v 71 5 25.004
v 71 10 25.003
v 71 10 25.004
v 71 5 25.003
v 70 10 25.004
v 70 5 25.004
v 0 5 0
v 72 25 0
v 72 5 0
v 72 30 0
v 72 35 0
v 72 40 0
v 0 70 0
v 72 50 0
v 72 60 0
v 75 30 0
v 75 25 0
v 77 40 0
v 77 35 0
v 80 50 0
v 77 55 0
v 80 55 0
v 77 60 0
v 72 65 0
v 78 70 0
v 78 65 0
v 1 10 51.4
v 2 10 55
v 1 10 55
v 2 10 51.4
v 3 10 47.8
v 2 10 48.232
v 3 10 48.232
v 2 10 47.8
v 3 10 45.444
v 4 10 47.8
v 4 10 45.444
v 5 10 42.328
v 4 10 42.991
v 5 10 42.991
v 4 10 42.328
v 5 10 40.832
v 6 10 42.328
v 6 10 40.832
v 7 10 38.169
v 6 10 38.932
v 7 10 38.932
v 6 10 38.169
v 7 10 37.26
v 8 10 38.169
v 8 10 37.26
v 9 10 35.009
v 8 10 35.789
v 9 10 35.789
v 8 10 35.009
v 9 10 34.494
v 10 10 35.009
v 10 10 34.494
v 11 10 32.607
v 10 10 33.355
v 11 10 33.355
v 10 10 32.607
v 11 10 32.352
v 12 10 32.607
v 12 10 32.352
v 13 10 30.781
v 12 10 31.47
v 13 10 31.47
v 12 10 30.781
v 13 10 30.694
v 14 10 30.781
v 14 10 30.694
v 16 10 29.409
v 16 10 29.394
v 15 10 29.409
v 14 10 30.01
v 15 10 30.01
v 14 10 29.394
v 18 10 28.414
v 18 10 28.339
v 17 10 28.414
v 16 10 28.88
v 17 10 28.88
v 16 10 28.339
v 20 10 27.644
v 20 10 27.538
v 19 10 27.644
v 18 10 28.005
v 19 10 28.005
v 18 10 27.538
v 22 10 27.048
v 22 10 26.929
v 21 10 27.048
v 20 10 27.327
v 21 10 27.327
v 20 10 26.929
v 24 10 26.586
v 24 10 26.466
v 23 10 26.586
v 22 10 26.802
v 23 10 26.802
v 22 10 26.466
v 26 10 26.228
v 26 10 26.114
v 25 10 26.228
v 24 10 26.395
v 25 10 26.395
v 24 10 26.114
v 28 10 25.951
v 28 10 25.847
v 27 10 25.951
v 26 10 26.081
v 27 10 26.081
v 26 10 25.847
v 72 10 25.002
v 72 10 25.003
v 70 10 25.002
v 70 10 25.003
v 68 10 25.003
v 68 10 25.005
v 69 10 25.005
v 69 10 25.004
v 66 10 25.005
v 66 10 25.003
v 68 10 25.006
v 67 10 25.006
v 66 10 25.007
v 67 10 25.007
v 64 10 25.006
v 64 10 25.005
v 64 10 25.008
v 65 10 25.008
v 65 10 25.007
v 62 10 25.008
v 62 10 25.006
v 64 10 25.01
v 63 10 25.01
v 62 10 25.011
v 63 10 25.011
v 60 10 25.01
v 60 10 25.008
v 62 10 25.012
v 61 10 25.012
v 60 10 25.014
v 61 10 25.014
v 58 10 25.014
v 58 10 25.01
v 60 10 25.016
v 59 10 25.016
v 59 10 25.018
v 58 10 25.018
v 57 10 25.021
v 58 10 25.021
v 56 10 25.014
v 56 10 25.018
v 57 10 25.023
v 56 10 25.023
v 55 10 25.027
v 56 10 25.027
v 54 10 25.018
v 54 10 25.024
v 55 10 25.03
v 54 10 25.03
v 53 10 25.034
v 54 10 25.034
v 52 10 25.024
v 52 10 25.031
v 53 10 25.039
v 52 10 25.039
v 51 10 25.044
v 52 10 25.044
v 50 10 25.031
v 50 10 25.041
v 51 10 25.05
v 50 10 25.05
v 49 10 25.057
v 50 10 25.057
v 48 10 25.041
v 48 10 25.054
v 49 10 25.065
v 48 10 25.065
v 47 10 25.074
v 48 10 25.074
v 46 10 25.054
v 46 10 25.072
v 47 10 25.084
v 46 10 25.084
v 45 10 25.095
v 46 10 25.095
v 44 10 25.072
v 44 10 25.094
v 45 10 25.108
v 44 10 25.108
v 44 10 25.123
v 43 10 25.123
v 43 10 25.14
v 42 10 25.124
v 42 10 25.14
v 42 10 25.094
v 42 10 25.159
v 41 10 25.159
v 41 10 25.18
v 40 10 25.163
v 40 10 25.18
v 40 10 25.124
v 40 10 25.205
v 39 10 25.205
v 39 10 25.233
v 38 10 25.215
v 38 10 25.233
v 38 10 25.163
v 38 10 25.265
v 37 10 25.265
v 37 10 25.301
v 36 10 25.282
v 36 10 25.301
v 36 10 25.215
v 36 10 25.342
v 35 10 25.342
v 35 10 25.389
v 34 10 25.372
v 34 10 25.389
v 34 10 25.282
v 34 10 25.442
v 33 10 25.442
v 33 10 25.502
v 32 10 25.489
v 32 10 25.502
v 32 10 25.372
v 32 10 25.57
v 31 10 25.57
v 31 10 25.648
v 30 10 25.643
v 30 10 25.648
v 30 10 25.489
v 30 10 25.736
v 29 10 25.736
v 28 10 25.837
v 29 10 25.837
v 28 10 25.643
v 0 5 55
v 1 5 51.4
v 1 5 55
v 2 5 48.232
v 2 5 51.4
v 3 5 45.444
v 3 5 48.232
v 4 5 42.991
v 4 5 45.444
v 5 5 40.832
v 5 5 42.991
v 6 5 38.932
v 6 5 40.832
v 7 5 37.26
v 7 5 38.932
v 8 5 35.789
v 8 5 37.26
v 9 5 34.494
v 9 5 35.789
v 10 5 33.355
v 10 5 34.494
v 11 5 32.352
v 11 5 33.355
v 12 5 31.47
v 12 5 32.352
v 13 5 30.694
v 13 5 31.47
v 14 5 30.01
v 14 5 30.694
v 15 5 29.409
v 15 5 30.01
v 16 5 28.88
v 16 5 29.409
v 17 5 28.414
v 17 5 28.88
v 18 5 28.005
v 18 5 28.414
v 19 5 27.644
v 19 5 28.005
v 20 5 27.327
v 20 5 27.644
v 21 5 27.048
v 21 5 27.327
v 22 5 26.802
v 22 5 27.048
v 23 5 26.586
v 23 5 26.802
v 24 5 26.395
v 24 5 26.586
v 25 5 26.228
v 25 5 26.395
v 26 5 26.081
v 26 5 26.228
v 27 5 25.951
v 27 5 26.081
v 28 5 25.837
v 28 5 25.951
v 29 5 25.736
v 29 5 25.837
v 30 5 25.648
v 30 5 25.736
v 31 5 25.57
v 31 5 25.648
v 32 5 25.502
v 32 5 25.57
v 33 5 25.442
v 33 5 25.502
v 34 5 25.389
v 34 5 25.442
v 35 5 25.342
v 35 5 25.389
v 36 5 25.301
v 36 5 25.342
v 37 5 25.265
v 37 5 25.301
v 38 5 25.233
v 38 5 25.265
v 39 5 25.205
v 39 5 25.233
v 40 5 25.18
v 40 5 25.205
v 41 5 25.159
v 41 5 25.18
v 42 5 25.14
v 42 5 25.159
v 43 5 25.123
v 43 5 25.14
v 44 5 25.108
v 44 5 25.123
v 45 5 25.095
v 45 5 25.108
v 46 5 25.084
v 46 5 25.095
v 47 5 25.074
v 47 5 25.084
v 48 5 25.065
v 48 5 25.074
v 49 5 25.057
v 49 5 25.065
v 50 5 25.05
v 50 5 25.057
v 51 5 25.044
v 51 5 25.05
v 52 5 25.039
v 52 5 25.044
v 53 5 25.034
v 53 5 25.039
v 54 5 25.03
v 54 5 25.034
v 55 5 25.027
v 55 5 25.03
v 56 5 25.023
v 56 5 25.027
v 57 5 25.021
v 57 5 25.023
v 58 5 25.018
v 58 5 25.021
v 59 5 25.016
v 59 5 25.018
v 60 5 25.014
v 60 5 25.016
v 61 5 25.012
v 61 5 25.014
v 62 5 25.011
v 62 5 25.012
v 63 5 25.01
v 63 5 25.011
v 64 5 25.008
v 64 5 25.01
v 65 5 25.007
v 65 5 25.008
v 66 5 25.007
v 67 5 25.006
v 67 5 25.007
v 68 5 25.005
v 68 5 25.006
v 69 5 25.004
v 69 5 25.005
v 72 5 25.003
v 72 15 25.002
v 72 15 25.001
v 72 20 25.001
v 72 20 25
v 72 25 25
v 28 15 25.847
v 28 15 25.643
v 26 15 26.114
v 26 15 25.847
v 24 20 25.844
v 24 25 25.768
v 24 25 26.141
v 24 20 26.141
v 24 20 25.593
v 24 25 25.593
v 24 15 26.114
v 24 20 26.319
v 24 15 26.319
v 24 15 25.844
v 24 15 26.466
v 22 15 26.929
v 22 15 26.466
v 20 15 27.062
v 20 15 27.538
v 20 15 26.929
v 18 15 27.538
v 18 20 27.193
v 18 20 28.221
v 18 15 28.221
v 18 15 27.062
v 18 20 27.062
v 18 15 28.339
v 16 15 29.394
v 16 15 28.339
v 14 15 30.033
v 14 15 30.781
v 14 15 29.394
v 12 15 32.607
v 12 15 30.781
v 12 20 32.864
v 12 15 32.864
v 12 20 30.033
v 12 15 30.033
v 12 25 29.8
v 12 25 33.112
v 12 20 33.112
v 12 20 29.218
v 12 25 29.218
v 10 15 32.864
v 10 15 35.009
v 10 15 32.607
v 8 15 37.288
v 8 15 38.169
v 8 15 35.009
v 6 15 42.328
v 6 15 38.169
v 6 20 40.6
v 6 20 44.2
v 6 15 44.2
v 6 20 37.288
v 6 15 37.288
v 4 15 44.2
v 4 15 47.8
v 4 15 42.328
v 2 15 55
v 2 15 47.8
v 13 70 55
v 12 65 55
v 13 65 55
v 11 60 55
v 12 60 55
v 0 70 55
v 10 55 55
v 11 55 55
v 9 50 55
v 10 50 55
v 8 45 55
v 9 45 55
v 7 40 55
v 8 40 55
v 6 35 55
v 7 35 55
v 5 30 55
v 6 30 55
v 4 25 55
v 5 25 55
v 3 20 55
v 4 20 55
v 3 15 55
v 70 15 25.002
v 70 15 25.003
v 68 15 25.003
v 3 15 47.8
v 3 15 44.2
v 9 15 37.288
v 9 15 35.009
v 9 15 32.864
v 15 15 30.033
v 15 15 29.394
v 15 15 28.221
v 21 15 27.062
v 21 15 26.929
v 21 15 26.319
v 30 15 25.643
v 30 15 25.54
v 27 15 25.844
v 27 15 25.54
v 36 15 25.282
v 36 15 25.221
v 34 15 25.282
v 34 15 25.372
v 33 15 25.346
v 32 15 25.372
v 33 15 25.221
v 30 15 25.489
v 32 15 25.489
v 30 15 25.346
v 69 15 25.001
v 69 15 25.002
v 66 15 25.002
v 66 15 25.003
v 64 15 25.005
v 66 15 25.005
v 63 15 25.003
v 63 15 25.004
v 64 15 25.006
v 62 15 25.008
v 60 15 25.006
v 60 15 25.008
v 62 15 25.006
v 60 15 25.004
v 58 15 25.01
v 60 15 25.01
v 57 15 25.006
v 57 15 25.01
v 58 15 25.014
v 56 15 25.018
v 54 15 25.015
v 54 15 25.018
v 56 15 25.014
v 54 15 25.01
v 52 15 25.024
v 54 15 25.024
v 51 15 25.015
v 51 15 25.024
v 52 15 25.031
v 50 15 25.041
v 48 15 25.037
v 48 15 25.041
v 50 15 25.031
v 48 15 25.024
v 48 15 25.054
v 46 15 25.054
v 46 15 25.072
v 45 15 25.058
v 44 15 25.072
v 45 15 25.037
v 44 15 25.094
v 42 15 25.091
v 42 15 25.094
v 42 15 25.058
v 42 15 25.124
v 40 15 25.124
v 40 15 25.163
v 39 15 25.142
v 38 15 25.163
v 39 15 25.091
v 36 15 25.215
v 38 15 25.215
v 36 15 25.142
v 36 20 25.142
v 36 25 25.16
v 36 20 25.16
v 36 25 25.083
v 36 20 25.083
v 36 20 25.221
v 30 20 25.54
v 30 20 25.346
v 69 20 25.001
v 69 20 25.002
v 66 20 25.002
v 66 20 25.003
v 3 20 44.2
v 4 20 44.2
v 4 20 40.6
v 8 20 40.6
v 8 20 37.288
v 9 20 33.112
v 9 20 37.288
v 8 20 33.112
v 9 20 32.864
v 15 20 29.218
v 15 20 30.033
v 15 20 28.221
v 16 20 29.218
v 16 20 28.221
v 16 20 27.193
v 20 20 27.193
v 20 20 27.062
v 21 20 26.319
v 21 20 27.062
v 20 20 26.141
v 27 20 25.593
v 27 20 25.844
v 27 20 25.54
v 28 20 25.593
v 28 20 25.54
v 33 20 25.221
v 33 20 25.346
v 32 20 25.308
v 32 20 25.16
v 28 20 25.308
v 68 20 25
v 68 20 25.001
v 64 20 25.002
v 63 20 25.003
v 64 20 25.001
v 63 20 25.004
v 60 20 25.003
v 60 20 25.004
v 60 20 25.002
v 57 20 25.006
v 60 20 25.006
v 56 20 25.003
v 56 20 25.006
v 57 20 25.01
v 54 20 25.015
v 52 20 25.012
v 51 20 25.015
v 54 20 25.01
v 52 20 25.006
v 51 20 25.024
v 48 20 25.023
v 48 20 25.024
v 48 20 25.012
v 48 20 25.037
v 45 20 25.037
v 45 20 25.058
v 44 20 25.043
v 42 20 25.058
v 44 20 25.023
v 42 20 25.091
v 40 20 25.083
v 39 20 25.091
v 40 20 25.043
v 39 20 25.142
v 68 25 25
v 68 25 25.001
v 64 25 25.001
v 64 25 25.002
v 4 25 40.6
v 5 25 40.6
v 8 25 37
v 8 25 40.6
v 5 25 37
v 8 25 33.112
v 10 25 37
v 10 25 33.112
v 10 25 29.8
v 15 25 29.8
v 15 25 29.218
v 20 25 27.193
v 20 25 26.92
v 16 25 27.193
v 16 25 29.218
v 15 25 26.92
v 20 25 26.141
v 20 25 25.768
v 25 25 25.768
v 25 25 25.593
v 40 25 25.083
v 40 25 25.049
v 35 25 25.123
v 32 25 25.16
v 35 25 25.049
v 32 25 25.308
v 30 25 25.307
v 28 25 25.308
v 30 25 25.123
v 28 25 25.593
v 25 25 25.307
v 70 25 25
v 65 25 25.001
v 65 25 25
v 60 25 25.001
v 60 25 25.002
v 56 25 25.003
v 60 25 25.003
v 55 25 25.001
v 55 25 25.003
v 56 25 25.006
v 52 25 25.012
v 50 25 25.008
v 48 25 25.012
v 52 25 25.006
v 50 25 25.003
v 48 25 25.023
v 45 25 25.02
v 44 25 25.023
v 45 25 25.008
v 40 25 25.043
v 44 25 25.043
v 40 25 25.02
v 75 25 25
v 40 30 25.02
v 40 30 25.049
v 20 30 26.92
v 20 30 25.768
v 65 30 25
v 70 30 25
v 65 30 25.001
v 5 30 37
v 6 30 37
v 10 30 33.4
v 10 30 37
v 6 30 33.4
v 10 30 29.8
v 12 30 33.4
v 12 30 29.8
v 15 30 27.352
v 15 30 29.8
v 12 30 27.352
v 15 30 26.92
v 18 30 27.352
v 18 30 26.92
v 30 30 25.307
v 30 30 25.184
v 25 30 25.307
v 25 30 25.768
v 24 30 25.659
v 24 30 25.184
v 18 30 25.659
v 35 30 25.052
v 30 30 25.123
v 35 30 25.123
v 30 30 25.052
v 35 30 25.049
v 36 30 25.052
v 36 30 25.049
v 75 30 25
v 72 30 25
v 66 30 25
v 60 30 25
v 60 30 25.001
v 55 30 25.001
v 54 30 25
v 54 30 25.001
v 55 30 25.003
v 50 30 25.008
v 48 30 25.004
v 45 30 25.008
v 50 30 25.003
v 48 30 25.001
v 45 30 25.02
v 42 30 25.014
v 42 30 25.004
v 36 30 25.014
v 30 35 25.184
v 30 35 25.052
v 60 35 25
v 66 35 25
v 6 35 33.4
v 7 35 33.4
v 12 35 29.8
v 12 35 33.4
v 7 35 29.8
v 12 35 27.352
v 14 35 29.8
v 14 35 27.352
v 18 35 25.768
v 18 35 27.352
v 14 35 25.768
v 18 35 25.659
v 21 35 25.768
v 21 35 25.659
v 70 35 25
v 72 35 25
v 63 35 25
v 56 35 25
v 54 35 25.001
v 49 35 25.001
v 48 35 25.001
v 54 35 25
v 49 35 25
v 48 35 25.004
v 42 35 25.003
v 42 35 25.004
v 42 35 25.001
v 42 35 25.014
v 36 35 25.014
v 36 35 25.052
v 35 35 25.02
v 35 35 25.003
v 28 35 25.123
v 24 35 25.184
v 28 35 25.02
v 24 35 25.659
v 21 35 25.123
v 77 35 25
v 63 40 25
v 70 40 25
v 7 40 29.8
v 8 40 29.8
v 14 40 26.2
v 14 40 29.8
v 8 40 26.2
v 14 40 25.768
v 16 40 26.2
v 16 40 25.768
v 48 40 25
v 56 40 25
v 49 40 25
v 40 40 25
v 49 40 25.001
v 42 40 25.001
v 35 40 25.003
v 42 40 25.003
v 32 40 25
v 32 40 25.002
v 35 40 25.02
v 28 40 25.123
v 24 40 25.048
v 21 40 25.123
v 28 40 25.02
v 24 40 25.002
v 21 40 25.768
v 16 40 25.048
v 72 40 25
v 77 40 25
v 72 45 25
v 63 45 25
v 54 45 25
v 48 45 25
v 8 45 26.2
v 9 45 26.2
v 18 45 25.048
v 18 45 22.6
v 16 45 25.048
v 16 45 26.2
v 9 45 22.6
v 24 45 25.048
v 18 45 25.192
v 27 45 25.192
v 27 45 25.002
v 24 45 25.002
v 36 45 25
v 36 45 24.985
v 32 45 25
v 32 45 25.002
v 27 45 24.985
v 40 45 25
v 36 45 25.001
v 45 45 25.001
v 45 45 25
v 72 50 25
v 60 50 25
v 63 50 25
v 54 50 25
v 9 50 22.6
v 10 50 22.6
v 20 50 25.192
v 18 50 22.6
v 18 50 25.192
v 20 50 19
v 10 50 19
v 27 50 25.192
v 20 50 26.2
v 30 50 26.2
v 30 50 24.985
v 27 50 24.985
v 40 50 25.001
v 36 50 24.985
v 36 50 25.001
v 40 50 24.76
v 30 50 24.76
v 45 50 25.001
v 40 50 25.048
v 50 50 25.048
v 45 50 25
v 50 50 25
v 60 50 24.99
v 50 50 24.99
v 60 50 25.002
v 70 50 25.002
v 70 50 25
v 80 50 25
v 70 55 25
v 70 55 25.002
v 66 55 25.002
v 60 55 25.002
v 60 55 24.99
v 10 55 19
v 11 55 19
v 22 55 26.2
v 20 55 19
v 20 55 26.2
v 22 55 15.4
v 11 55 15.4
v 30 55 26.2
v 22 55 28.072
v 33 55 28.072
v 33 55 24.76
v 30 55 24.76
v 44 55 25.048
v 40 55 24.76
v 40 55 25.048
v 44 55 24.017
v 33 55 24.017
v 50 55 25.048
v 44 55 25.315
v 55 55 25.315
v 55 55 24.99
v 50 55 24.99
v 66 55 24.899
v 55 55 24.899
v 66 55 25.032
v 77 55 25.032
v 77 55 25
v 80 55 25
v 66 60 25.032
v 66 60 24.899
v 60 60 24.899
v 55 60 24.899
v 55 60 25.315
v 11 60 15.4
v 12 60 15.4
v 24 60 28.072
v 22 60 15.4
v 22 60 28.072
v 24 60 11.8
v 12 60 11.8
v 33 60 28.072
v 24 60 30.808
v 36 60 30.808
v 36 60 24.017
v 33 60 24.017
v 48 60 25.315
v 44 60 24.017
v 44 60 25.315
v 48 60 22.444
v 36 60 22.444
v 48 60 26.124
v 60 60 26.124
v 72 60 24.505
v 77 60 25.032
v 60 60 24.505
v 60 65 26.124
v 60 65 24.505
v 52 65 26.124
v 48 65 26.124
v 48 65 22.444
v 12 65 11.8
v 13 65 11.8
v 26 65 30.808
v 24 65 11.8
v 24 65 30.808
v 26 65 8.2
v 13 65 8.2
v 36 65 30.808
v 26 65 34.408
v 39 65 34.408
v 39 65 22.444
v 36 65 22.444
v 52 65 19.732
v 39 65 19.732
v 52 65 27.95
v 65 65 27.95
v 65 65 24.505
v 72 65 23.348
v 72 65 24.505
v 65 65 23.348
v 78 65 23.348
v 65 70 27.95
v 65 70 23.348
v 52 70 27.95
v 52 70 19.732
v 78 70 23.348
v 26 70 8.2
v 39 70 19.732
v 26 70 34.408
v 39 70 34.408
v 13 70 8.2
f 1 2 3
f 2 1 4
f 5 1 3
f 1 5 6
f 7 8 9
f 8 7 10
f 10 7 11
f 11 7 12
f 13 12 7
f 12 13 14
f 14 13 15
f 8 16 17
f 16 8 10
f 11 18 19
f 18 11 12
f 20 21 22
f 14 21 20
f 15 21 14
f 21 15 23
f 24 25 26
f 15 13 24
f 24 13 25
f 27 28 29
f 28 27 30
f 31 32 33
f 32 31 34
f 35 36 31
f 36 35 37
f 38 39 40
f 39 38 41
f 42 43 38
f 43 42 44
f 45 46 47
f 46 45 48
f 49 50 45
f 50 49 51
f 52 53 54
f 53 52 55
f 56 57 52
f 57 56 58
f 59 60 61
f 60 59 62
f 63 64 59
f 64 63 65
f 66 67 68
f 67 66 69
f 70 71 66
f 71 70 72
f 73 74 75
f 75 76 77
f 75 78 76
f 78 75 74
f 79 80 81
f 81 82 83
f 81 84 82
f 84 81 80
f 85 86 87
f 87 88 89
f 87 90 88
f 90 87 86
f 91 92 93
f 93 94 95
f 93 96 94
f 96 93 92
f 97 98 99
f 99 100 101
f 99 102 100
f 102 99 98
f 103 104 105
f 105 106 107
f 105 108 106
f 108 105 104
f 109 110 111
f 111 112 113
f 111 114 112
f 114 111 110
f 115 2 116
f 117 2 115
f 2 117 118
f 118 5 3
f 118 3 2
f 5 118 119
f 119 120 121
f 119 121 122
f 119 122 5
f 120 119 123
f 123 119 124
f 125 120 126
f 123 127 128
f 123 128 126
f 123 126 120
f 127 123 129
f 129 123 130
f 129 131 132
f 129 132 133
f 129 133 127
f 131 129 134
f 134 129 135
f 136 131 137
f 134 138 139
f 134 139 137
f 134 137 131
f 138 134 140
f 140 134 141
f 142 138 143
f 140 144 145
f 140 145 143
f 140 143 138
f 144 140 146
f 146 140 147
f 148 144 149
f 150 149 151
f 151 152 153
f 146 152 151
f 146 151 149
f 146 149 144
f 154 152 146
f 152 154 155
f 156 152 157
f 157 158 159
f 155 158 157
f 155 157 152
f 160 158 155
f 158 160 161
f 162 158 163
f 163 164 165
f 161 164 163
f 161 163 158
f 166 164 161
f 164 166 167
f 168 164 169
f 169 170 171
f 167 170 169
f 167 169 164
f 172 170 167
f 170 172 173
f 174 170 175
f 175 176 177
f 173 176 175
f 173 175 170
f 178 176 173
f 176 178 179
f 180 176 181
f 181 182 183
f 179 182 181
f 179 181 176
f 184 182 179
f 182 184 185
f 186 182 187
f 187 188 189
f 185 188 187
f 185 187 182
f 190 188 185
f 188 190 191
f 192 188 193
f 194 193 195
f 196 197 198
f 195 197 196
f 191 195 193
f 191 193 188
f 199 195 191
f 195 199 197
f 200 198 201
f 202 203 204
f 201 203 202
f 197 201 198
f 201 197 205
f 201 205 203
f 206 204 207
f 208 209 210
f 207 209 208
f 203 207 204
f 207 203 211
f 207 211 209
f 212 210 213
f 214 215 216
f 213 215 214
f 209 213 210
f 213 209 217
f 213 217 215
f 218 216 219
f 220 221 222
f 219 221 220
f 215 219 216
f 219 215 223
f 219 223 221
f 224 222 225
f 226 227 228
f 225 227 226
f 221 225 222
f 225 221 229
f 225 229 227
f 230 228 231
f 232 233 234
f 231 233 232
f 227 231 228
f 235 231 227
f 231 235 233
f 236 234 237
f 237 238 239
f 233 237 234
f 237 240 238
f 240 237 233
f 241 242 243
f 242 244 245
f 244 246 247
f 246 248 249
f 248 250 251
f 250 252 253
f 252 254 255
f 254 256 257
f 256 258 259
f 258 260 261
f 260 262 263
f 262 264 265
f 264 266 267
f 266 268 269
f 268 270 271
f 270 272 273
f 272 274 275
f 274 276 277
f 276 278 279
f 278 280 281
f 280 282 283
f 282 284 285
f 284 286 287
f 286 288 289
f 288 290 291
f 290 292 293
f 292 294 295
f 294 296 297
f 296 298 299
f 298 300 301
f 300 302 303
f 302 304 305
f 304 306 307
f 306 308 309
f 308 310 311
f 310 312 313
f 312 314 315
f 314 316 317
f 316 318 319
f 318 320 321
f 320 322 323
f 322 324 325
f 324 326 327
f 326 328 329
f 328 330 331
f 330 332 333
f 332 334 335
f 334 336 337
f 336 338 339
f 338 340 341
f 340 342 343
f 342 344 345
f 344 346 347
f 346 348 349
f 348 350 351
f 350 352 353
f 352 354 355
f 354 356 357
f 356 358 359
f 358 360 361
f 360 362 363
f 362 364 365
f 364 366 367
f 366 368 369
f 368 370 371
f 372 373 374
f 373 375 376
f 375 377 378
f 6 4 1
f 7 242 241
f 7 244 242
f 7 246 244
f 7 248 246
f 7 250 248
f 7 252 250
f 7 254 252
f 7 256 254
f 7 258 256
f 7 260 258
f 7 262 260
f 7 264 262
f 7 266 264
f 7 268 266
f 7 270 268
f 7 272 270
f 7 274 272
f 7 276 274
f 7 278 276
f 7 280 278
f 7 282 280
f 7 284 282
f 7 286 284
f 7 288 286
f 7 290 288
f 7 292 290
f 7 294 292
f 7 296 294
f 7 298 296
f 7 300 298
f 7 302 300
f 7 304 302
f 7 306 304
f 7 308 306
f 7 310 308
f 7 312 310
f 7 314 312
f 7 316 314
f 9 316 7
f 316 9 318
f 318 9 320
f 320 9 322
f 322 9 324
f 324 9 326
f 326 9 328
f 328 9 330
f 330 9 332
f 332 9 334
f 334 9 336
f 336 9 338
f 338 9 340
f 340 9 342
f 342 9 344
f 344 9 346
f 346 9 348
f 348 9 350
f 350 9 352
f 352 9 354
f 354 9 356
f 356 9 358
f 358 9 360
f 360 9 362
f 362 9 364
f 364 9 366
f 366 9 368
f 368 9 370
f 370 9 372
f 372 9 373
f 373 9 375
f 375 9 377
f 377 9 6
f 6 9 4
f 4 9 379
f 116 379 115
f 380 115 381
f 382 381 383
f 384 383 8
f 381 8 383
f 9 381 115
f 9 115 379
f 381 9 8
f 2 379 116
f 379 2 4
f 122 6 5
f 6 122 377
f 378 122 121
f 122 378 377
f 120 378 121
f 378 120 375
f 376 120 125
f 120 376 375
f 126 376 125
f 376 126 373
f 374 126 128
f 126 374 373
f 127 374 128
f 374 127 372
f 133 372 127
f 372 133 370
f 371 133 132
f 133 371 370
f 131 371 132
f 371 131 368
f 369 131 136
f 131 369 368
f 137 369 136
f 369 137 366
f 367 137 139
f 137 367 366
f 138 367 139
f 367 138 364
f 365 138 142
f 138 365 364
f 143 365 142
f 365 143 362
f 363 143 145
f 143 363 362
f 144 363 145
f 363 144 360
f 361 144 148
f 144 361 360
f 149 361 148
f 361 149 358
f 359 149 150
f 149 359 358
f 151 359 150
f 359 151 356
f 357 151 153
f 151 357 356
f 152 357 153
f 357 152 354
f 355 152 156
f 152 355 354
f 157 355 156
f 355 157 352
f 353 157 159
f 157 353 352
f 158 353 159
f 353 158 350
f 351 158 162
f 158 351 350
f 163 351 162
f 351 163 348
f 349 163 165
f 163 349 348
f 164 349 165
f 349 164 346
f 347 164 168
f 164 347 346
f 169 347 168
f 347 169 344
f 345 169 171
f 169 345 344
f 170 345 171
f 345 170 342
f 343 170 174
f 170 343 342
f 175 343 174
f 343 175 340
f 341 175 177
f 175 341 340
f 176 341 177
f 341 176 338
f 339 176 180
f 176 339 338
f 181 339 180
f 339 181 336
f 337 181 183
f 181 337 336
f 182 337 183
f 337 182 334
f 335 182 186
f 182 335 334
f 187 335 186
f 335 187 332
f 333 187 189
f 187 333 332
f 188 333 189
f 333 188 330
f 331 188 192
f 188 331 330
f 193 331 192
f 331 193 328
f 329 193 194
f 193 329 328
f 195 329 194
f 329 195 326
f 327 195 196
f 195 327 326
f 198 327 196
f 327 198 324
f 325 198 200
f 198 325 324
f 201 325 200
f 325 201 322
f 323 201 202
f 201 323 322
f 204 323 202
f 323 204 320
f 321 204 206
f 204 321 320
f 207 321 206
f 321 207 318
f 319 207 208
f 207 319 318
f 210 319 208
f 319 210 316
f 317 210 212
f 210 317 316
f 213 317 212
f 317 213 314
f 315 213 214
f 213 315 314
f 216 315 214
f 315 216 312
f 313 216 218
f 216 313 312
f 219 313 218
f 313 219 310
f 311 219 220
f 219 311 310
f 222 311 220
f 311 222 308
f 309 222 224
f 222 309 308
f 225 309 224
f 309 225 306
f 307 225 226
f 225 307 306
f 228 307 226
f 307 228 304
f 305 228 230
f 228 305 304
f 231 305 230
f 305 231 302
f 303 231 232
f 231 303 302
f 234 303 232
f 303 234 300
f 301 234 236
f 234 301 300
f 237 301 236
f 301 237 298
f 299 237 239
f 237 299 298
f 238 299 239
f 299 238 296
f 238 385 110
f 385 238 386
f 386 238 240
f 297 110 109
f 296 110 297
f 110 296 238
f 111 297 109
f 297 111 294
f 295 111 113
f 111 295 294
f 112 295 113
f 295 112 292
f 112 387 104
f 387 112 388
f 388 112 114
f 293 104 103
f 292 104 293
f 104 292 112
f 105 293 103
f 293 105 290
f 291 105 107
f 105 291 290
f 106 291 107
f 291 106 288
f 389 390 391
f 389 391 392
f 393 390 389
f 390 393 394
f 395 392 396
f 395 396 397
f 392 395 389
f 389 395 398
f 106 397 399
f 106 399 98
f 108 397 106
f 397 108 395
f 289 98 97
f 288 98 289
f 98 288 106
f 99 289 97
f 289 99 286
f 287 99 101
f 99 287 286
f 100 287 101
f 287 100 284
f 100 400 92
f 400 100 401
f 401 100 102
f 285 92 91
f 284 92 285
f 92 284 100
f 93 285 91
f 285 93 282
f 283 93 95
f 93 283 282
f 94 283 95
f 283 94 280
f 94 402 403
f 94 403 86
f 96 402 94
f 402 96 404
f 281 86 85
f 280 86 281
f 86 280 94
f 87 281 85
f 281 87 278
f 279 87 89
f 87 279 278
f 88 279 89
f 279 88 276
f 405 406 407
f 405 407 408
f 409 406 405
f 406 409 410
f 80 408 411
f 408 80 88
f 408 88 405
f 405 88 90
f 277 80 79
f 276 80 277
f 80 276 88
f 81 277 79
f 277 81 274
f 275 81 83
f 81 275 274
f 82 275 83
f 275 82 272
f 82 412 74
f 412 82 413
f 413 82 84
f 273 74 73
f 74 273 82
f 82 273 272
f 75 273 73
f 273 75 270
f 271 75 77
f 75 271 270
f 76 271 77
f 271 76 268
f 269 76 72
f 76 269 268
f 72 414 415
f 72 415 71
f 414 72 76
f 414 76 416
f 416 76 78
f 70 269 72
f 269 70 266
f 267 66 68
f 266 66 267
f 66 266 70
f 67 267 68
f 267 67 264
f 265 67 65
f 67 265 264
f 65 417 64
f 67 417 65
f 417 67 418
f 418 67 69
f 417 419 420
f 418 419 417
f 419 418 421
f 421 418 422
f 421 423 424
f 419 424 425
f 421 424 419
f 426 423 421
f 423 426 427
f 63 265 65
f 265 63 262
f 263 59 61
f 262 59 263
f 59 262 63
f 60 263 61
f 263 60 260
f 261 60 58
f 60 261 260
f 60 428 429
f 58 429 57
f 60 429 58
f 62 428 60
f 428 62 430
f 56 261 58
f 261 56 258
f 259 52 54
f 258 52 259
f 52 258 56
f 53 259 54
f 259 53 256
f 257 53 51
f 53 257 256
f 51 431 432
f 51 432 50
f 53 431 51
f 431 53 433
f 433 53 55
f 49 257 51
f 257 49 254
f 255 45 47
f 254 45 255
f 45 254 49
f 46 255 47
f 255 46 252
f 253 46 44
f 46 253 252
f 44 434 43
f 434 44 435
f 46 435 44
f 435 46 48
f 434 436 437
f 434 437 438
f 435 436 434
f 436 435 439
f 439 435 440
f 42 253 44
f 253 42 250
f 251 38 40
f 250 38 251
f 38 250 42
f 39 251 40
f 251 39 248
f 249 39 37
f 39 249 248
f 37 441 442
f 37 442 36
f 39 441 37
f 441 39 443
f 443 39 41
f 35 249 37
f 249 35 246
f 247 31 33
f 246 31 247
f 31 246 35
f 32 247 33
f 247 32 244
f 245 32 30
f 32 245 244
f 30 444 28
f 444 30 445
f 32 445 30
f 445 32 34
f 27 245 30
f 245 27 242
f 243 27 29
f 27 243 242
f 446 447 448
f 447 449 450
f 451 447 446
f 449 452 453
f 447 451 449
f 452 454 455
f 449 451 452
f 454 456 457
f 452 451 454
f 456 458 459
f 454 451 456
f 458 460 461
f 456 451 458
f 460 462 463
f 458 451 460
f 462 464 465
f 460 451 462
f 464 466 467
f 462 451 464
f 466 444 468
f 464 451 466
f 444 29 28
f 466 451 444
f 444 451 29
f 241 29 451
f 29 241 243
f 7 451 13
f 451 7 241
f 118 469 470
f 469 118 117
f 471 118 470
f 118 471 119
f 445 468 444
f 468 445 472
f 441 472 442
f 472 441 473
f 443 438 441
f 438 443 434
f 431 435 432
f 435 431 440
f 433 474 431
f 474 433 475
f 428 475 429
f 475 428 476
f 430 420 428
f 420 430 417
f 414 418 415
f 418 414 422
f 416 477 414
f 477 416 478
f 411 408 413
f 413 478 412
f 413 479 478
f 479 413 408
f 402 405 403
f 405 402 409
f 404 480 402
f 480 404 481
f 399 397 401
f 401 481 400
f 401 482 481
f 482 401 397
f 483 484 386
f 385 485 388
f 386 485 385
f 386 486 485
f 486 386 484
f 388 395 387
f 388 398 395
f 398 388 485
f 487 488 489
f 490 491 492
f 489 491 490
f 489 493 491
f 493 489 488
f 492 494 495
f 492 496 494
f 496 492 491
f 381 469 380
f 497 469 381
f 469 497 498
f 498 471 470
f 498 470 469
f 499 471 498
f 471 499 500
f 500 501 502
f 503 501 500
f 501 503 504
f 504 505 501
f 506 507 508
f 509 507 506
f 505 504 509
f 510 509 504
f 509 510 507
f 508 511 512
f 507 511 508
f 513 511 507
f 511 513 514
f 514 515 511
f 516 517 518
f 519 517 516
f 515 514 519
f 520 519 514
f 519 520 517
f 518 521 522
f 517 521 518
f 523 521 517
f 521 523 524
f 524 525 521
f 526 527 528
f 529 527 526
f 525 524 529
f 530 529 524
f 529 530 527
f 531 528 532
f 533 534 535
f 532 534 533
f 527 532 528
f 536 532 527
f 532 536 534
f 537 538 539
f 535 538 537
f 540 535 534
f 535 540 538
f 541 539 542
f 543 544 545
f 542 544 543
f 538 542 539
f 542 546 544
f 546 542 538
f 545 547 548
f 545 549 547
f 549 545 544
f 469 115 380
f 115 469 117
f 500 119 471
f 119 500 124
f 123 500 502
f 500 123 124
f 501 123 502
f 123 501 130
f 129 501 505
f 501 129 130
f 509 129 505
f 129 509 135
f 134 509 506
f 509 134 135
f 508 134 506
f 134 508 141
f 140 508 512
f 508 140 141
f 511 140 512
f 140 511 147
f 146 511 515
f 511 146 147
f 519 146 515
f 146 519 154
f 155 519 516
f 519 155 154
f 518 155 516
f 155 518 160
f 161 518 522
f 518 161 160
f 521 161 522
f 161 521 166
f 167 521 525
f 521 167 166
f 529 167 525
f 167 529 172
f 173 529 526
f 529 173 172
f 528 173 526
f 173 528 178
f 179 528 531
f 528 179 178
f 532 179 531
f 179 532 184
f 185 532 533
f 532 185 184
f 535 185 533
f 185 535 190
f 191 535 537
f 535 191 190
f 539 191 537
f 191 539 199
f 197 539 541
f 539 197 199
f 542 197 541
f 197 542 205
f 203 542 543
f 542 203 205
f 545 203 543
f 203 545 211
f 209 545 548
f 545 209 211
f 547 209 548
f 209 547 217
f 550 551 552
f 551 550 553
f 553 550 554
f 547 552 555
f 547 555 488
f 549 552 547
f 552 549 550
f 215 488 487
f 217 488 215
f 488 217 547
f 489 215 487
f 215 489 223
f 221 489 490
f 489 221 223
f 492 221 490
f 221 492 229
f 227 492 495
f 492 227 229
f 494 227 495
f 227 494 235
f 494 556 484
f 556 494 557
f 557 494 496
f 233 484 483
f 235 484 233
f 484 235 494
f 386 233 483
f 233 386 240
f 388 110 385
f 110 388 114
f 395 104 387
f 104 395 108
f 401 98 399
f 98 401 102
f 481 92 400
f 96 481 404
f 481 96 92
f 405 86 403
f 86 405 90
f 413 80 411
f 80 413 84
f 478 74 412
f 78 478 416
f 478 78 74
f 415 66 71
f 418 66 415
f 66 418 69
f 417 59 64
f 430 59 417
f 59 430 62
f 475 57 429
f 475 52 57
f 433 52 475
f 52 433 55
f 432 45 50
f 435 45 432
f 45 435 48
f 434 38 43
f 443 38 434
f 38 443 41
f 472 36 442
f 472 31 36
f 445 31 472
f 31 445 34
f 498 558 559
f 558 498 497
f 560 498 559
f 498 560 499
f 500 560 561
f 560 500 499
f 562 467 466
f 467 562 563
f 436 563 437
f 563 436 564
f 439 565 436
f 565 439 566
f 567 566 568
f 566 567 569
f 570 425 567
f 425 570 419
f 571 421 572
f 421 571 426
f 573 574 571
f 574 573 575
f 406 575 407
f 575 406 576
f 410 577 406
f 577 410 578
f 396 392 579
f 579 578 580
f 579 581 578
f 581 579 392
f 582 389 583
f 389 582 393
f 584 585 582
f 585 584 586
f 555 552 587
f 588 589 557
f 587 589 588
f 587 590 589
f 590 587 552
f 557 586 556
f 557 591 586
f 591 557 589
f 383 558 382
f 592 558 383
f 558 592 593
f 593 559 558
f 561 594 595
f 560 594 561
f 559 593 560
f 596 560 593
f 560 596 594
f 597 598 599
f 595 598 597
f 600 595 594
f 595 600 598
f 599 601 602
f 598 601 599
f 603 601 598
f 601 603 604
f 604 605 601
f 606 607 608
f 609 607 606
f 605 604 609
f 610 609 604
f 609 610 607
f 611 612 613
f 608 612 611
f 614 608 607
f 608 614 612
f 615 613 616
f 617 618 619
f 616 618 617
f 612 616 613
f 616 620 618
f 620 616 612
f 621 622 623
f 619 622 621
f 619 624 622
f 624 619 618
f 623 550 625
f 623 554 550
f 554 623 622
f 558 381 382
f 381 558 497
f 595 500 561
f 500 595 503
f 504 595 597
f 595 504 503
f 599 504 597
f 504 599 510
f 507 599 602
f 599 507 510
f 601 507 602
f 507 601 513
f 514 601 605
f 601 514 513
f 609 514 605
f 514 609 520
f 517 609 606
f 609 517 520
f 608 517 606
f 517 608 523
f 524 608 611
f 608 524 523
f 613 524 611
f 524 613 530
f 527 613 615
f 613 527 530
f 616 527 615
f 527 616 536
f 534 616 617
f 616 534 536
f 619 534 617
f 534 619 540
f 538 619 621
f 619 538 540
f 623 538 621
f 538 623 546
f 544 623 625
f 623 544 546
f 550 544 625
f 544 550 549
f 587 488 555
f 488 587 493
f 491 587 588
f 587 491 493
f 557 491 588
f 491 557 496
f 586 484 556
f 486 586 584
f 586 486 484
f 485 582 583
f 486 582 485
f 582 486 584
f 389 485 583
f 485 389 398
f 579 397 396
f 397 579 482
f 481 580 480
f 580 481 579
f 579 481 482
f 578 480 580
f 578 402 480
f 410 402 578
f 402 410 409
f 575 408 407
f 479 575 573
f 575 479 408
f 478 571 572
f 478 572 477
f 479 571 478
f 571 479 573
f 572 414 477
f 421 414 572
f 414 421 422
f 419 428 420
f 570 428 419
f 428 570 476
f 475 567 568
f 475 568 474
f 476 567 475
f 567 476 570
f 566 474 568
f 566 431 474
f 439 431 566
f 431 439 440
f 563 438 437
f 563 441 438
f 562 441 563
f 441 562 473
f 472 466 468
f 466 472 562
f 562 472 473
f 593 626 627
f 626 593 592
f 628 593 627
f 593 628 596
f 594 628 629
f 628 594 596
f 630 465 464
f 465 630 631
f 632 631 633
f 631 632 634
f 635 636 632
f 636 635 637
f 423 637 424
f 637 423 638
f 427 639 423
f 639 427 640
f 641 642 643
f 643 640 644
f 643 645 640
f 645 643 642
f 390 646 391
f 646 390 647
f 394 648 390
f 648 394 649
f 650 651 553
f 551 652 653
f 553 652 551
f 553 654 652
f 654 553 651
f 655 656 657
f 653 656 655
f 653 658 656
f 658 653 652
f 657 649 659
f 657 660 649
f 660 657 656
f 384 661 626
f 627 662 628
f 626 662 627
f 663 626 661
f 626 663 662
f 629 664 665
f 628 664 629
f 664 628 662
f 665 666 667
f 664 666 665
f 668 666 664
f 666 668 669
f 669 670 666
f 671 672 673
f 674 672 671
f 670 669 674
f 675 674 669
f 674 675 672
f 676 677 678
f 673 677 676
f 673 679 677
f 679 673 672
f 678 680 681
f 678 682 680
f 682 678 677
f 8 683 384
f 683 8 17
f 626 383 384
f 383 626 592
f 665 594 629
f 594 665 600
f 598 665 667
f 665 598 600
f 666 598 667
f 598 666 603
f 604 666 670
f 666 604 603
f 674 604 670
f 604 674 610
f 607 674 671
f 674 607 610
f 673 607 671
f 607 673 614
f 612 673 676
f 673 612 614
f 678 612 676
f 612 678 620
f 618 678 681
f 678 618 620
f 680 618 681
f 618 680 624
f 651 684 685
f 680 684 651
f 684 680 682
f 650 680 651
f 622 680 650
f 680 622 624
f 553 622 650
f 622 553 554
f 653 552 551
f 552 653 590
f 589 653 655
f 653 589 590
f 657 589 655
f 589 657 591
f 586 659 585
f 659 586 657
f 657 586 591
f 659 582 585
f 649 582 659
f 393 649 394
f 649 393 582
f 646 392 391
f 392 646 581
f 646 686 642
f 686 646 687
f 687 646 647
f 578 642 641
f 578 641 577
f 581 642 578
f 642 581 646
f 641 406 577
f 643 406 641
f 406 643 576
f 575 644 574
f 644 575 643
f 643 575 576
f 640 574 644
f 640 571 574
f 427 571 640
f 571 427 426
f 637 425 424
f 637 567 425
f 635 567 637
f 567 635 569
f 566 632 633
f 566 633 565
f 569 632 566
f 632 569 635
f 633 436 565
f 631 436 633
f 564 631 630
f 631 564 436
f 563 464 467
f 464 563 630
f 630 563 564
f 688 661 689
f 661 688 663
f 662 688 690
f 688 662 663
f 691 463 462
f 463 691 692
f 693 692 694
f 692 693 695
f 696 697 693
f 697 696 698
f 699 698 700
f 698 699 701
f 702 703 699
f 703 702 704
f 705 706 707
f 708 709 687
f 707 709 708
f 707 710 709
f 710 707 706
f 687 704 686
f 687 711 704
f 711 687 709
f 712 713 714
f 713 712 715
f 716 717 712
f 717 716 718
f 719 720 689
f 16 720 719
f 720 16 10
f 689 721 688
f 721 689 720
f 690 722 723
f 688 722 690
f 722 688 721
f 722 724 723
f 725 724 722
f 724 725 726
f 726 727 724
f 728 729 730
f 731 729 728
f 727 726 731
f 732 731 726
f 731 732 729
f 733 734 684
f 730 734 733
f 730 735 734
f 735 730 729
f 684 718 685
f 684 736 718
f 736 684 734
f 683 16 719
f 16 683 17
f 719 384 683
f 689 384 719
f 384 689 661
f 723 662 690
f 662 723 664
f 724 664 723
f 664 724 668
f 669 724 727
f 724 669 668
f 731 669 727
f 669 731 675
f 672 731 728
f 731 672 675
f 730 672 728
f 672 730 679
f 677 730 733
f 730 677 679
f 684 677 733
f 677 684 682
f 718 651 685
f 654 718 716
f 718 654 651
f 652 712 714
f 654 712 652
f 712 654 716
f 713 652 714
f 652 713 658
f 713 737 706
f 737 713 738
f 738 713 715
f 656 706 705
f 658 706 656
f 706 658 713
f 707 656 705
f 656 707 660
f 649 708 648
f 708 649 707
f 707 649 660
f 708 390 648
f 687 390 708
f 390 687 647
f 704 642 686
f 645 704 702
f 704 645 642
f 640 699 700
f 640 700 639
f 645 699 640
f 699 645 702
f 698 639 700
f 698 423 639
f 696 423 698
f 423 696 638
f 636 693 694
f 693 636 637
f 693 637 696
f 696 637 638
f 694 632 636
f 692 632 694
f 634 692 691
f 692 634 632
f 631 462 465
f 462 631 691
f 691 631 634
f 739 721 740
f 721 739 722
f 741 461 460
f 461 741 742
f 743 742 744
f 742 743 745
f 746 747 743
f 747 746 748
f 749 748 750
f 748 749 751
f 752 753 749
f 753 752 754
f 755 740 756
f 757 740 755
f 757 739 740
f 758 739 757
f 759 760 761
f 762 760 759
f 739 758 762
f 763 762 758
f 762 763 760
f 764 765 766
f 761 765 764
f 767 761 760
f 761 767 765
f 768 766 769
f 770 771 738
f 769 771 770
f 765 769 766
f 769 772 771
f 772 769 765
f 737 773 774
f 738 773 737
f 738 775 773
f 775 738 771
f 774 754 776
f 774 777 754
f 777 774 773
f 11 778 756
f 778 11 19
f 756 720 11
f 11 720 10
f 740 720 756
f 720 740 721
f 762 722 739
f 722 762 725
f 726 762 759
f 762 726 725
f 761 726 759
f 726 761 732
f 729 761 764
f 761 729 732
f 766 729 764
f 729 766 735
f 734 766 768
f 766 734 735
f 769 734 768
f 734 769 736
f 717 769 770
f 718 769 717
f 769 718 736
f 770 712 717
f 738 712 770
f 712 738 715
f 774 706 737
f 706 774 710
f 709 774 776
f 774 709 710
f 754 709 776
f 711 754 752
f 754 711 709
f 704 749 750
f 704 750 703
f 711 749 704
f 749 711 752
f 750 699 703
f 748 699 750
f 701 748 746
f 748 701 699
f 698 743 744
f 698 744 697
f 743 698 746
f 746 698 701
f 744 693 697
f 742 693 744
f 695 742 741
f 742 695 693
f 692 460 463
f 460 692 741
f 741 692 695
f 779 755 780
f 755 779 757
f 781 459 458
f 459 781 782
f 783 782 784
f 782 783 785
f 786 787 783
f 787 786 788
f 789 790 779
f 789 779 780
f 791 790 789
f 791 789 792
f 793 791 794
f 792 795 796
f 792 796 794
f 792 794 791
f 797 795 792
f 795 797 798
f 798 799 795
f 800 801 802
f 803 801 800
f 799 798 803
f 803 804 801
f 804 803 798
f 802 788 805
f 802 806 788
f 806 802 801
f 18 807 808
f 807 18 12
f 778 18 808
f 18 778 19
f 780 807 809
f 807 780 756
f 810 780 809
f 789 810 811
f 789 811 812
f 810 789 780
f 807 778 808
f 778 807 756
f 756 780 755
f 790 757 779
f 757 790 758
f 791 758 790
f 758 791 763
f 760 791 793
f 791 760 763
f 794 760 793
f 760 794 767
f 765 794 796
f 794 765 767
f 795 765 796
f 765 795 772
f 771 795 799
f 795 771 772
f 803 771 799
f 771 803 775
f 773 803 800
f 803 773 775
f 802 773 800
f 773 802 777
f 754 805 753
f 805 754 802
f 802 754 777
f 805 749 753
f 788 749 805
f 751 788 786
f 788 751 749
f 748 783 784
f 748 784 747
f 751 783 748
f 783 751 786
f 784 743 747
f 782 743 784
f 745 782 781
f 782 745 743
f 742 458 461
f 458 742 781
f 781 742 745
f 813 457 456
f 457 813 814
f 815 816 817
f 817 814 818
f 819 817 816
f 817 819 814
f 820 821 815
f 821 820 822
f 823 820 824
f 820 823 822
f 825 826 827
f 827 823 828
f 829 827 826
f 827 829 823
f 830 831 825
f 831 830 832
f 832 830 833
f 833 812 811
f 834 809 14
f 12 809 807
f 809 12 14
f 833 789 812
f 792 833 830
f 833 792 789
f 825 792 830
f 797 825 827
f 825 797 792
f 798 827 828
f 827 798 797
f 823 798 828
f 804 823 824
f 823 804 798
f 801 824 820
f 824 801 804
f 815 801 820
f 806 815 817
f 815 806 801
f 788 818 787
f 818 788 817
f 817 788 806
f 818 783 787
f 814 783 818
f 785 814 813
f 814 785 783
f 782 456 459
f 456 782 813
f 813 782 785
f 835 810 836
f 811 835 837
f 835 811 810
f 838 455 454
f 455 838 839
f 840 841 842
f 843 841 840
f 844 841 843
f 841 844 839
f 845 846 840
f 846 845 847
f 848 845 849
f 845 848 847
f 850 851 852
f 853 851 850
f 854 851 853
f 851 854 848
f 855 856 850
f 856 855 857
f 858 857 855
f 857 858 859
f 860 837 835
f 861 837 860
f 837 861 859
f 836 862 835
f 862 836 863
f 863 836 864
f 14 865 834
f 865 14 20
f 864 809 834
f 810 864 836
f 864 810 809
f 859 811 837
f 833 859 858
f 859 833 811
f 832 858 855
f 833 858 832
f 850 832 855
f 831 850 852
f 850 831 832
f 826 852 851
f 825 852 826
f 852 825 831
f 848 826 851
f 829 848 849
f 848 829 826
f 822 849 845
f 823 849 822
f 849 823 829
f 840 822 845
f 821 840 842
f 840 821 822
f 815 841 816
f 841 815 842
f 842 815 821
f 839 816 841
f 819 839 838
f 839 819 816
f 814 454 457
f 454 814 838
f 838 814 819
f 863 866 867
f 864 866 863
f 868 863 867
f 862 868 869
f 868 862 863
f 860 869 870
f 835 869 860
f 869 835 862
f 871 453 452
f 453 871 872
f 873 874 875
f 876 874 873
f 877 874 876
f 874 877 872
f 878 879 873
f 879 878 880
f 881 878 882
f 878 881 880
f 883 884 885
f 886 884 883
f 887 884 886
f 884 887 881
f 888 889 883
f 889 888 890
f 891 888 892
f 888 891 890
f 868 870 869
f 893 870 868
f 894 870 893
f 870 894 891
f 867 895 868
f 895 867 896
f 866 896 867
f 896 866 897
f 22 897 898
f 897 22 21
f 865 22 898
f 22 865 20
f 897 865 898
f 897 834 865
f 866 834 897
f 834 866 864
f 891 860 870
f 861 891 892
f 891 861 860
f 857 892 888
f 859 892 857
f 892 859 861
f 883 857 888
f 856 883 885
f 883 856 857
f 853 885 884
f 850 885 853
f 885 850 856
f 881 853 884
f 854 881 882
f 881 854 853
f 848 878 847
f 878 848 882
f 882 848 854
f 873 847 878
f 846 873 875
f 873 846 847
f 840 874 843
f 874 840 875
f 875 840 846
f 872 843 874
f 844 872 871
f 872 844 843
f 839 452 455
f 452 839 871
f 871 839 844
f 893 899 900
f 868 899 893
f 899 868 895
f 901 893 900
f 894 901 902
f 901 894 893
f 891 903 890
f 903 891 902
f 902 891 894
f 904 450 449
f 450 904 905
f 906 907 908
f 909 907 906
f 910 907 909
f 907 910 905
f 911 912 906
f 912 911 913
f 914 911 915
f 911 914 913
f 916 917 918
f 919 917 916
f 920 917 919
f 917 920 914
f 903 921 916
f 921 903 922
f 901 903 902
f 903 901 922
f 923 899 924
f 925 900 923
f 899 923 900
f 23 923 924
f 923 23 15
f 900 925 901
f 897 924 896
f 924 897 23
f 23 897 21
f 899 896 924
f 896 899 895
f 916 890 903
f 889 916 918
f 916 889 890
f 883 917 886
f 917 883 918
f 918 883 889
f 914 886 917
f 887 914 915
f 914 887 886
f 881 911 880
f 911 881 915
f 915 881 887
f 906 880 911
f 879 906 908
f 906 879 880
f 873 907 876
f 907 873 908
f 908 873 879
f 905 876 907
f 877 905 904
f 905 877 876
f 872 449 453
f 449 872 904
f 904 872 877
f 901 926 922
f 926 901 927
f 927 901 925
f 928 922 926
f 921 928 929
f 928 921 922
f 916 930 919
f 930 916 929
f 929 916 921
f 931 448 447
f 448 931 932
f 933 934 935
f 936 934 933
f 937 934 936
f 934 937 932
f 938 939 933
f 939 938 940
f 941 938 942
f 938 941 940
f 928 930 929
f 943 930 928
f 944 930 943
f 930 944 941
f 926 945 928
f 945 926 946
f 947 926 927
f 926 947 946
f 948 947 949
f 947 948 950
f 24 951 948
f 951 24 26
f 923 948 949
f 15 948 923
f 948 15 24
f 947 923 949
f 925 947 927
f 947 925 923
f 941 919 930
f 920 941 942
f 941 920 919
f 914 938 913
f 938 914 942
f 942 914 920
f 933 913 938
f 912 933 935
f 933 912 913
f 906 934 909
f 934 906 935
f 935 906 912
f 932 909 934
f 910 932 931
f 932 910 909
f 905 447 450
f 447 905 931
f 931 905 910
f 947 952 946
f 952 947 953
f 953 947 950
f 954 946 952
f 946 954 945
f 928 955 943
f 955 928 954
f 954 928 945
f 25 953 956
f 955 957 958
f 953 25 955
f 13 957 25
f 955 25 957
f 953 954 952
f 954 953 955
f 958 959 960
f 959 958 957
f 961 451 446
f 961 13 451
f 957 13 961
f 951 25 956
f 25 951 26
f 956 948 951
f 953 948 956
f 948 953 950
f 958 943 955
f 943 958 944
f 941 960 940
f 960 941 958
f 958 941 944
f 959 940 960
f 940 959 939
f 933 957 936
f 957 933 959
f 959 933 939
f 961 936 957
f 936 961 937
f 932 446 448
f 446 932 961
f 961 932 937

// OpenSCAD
// File stepSizeDecay.scad
// demonstrates numerical error produced by various step sizes
// using exponential decay function
// (c) 2019-2022 Rich Cameron, for the book Make:Calculus
// Licensed under a Creative Commons, Attribution,
// CC-BY 4.0 international license, per
// https://creativecommons.org/licenses/by/4.0/
// Attribute to Rich Cameron, at
// repository github.com/whosawhatsis/Calculus

a = -0.12; //exponential decay factor 
w = 5; //width in y direction of each iteration
offset = 25; // height in millimeters for f(x,step) = 0
 
// h = step in x direction - varied as a parameter
// f(x) is assumed to be an exponential here 
// And assumed to start at x = 0

for(i = [1:13]) translate([0, i * w, 0]) f(h = i);

module f(i = 0,  h, start = 30, end = 2 * 3 * 4 * 3) {
	cube([h, w, start + offset]);
	if (i < (end - h) )
        translate([h, 0, 0]) 
        f(i + h, h, start * (1 + h * a), end);
}
